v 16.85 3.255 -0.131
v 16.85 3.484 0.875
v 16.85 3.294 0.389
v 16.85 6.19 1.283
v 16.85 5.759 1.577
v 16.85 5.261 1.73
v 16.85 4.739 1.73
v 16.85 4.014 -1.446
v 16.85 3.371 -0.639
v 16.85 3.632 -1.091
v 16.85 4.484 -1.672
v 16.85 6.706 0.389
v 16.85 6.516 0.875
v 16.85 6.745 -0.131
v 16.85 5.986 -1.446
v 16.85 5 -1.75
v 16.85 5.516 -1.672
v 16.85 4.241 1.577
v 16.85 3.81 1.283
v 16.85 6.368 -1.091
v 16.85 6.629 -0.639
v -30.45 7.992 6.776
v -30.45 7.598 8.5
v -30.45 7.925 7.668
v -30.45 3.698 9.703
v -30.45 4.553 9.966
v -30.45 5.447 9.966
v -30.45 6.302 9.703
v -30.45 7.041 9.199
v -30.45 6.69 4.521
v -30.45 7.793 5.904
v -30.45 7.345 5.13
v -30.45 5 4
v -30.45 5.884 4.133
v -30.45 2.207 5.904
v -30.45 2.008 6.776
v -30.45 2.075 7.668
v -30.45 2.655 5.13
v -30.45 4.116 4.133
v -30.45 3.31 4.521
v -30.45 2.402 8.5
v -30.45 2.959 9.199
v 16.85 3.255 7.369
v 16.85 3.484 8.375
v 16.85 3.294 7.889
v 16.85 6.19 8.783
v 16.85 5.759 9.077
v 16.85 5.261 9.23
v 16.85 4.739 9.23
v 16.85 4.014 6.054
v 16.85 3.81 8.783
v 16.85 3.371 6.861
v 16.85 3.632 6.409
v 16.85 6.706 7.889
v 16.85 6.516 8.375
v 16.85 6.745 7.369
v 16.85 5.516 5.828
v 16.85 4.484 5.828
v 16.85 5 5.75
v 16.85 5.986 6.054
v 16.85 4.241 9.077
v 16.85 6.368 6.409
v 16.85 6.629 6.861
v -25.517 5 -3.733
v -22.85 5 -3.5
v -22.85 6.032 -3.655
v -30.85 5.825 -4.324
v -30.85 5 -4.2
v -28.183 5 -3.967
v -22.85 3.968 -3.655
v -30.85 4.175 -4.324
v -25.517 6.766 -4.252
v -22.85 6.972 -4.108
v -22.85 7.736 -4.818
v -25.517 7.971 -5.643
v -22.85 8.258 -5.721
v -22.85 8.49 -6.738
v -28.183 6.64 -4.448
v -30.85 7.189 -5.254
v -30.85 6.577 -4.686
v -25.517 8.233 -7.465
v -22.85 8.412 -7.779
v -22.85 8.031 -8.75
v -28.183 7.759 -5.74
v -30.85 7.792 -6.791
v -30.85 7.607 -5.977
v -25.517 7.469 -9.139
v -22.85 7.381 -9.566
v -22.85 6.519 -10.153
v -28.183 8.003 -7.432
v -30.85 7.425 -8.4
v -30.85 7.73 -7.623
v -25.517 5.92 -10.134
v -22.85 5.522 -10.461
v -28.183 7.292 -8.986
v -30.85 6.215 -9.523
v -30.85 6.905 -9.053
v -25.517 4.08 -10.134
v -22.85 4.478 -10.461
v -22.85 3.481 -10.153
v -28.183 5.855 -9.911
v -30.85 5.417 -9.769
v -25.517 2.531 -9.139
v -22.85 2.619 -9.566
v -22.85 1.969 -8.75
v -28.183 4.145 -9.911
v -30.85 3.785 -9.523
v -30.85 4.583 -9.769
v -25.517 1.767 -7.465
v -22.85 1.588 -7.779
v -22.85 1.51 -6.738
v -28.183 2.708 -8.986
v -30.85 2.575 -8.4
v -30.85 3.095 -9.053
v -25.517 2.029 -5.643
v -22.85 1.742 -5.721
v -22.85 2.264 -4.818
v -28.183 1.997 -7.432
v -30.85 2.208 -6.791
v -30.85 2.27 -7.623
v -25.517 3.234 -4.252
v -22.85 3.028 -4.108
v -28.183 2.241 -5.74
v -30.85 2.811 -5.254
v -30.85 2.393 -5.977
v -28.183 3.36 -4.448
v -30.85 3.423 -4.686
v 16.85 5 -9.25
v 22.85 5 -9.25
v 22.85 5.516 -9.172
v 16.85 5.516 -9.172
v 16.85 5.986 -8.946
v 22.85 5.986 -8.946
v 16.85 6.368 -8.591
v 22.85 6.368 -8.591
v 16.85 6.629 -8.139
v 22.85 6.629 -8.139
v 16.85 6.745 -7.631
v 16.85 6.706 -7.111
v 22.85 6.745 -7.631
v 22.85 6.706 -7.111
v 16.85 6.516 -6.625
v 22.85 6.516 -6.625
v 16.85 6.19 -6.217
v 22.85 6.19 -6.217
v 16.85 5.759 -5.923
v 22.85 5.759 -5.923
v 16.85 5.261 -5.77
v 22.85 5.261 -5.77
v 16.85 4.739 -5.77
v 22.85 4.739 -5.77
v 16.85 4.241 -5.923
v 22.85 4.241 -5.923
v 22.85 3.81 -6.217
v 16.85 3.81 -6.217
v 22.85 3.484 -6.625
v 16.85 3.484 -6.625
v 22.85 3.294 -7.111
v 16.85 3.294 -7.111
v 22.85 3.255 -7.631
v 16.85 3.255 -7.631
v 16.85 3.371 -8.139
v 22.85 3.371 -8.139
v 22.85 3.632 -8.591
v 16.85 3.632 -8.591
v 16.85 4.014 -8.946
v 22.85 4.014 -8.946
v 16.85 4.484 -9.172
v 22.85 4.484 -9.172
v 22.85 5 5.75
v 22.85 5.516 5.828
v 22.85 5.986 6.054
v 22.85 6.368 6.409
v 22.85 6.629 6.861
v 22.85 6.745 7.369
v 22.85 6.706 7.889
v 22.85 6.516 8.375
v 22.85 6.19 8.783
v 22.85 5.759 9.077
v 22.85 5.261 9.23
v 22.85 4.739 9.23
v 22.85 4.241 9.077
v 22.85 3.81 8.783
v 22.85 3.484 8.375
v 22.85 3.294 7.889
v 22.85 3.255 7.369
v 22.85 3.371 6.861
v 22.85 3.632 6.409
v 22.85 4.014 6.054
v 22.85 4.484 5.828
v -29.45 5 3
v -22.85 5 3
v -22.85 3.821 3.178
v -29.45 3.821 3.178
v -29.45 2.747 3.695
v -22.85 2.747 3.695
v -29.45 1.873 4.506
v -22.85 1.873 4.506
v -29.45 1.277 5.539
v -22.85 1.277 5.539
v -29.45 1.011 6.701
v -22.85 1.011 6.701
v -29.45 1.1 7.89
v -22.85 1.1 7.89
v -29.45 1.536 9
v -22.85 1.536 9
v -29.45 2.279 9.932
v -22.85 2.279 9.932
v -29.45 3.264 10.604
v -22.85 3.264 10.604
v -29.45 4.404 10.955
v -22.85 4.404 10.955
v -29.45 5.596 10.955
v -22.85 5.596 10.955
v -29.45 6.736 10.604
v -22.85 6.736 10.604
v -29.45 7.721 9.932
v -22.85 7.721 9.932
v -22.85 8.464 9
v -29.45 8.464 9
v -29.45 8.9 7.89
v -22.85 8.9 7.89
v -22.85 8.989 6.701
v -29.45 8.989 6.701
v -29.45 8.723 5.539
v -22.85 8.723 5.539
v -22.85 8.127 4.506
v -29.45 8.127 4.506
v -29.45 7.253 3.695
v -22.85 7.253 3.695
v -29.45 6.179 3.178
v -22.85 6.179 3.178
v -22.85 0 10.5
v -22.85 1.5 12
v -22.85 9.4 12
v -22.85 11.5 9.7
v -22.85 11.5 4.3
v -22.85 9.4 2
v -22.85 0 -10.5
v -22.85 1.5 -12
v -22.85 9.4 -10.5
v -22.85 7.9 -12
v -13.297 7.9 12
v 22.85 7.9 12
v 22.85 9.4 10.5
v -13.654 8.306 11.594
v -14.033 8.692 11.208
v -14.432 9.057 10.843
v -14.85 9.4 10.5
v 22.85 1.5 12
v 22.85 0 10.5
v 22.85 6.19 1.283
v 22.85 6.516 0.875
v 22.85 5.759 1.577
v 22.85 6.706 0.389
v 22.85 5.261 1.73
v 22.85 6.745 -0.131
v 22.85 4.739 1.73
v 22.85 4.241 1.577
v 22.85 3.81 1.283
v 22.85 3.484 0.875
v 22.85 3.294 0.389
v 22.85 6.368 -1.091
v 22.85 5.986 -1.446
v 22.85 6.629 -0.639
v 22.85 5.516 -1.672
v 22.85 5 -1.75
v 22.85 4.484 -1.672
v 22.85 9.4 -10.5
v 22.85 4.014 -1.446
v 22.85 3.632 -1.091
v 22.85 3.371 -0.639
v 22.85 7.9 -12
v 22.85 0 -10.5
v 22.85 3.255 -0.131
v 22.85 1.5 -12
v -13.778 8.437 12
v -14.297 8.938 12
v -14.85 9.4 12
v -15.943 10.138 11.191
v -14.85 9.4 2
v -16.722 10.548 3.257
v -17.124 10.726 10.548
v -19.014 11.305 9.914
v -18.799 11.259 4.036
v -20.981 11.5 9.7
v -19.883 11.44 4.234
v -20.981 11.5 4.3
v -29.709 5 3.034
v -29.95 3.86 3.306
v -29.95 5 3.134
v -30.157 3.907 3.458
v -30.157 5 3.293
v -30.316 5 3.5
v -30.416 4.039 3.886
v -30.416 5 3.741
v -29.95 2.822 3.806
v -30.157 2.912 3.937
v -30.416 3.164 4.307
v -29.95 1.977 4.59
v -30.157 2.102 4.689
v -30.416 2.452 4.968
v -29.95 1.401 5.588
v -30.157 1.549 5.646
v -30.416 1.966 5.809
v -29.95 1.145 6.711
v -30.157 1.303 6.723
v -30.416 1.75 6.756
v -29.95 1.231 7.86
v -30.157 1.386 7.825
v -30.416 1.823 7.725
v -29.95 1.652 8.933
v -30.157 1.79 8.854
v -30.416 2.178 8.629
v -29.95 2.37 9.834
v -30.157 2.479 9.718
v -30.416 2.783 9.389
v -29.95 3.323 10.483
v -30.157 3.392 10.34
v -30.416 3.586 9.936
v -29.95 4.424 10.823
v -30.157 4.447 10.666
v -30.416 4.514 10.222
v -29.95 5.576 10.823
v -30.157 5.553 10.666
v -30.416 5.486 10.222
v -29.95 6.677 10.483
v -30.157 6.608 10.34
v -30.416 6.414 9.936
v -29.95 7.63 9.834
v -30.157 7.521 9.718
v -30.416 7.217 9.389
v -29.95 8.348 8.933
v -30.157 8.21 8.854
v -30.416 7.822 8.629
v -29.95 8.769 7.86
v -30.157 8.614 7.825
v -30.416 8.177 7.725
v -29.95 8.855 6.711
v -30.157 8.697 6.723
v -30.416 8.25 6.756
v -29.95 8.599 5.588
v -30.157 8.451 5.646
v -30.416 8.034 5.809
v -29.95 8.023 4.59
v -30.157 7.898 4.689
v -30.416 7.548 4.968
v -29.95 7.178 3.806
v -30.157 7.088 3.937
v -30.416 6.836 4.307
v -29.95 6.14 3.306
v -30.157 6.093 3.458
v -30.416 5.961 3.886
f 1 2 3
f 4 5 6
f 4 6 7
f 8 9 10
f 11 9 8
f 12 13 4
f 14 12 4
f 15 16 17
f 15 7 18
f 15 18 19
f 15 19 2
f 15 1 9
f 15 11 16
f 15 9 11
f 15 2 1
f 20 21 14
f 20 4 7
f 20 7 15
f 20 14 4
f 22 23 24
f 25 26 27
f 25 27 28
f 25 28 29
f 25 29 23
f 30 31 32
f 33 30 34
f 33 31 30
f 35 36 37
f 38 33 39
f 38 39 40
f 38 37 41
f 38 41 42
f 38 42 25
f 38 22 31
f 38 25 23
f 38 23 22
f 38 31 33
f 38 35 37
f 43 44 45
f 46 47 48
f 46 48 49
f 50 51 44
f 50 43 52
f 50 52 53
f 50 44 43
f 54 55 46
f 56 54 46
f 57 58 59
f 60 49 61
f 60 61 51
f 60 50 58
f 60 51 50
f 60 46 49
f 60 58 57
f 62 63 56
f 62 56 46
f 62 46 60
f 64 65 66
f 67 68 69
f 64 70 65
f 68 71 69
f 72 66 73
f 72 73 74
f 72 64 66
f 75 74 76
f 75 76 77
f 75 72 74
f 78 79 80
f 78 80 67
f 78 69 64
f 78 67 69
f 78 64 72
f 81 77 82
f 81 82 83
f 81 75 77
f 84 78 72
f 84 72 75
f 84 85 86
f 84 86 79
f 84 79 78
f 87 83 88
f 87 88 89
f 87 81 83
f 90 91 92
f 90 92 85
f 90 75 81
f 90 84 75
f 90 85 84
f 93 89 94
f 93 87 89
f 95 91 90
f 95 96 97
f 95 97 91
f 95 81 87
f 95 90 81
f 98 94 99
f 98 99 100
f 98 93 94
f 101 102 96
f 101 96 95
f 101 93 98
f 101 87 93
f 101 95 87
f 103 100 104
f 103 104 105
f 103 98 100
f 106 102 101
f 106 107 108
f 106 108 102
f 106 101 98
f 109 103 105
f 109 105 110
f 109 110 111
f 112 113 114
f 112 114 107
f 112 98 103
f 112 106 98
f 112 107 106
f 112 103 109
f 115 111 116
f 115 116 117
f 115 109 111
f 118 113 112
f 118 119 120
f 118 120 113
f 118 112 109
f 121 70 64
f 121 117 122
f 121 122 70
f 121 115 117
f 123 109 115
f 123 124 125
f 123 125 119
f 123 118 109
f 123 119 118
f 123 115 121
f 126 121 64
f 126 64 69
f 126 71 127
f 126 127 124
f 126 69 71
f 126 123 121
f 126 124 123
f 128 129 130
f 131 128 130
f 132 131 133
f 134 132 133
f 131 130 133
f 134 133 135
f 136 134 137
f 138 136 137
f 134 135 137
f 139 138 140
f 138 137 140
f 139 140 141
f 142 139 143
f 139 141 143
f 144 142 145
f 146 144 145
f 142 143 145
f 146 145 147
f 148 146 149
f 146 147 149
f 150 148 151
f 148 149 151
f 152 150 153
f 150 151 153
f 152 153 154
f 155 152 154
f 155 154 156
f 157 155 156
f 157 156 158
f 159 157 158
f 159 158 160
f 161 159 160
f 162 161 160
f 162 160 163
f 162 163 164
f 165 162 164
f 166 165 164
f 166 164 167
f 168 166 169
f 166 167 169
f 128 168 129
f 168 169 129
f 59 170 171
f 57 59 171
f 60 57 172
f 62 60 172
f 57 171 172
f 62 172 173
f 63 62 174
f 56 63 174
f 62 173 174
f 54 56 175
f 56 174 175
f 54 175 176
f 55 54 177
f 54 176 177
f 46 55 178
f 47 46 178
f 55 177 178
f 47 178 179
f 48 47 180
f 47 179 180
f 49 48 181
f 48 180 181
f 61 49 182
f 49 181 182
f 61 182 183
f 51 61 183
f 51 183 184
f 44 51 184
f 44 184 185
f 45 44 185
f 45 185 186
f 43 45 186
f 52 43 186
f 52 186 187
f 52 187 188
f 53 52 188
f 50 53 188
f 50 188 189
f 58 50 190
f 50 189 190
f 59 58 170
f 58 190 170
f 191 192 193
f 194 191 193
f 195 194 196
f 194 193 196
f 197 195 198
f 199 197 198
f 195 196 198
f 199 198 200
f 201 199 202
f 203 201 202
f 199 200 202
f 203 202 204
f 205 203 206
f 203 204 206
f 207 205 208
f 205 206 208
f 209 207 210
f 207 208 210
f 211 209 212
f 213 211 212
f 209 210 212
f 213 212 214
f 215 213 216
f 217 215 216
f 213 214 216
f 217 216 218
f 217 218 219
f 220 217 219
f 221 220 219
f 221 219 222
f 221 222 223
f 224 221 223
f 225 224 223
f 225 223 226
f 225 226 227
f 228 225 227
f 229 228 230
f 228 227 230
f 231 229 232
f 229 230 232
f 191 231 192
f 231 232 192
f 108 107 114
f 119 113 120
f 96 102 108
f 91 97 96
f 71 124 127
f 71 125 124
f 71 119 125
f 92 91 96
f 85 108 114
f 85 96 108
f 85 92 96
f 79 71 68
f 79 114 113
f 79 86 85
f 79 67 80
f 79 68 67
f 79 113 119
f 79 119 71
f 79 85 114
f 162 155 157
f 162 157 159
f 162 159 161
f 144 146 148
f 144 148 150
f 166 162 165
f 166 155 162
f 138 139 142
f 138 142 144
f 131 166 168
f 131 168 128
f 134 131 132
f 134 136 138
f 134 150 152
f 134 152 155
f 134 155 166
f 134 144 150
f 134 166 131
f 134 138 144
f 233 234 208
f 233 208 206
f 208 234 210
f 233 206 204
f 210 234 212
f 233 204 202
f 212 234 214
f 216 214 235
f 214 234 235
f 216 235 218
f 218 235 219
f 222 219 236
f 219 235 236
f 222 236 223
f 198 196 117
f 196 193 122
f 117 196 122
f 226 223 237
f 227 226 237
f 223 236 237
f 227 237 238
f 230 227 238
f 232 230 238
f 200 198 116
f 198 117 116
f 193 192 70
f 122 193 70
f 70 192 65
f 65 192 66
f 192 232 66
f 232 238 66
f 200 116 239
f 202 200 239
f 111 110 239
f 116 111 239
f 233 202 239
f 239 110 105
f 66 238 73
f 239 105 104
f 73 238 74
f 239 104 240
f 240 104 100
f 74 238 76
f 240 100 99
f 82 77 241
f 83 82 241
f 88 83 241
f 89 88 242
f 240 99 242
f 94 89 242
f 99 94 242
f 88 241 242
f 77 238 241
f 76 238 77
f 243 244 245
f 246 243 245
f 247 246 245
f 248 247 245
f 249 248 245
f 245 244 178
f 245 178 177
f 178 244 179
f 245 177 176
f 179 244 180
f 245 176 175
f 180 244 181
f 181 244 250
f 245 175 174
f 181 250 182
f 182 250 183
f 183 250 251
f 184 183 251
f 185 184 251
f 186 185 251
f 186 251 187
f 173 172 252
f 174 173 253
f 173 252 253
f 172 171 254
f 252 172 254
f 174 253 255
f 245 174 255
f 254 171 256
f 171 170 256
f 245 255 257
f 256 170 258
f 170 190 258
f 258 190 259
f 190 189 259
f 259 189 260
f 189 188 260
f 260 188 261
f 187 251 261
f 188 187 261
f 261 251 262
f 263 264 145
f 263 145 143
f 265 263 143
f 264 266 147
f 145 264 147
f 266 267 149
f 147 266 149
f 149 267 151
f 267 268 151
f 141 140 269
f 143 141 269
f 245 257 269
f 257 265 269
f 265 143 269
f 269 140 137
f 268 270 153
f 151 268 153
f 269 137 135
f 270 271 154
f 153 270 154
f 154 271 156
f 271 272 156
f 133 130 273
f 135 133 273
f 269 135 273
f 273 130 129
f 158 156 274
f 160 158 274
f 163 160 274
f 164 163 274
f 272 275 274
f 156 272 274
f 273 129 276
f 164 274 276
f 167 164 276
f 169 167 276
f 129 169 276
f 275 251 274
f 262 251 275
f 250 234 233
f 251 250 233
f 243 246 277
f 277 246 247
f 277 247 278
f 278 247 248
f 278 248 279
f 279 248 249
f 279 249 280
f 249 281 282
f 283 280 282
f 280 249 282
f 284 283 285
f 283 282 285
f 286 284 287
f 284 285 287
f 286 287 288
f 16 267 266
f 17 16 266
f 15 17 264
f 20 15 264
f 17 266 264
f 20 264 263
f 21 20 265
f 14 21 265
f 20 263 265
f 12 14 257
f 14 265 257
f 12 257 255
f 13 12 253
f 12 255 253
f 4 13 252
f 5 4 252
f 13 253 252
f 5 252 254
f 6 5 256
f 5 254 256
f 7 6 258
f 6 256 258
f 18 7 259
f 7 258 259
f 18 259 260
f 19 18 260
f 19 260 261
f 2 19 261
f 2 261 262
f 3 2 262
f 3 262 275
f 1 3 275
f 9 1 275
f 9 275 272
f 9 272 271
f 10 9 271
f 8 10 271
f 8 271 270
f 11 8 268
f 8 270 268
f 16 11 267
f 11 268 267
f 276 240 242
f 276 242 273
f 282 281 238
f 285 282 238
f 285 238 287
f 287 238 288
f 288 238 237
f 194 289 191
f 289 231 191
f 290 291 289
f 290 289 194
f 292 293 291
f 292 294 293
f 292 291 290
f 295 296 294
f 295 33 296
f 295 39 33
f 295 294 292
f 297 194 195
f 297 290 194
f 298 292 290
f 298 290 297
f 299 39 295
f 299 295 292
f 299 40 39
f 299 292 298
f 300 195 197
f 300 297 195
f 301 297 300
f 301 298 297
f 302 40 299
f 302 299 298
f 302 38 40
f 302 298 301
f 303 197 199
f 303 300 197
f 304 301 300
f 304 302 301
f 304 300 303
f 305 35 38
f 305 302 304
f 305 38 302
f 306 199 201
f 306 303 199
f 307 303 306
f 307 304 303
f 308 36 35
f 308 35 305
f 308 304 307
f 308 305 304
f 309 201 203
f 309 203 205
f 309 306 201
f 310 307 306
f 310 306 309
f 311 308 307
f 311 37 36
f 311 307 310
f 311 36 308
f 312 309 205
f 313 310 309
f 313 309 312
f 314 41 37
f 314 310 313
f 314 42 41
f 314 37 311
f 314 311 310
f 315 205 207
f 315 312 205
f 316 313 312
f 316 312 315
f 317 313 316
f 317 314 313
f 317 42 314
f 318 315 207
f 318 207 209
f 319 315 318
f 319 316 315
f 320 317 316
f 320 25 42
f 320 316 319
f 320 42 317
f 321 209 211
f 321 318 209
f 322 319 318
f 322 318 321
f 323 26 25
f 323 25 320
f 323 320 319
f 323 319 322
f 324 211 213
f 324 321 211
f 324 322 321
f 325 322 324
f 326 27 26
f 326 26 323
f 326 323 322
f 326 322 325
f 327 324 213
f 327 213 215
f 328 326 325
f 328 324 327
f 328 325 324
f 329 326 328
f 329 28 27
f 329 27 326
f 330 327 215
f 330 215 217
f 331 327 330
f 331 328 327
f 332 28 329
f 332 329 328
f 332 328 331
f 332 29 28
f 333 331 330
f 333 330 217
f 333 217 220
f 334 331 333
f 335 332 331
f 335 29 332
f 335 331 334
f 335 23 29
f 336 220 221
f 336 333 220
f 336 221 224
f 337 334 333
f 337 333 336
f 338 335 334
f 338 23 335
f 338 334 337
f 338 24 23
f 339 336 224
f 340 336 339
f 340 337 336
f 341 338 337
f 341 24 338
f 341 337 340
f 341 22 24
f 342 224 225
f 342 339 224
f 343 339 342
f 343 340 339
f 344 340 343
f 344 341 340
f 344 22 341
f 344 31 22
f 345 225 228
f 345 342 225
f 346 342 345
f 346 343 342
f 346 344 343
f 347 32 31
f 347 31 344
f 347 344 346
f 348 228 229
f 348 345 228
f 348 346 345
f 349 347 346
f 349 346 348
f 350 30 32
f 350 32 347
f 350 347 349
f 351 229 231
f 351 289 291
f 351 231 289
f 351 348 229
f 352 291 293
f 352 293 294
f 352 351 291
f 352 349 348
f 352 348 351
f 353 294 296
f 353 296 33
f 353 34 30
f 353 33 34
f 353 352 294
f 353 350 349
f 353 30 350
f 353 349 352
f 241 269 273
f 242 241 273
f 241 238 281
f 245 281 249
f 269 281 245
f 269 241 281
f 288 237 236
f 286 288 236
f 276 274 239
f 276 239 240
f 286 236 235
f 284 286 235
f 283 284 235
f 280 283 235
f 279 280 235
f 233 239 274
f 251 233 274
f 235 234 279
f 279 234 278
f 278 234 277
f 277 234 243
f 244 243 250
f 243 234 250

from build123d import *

# Parameters (mm, degrees)
SKETCH_1_W          = 45.7
SKETCH_1_H          = 24
EXTRUDE_1_DEPTH     = 9.4
SKETCH_2_R          = 1.75
CUT_EXTRUDE_1_DEPTH = 6
SKETCH_3_R          = 4
EXTRUDE_2_DEPTH     = 7.6
EXTRUDE_3_DEPTH     = 8
FILLET_1_R          = 10
CHAMFER_1_SIZE      = 1.5
SKETCH_5_R          = 3.5
EXTRUDE_4_DEPTH     = 8
EXTRUDE_4_TAPER     = 5
FILLET_2_R          = 1


with BuildPart() as part:
    # 草图1 → 凸台-拉伸1 (new body)
    with BuildSketch(Plane(origin=(0, 0, 0), x_dir=(1, 0, 0), z_dir=(0, 1, 0))):
        Rectangle(SKETCH_1_W, SKETCH_1_H)
    extrude(amount=EXTRUDE_1_DEPTH)

    # 草图2 → 切除-拉伸1 (cut)
    with BuildSketch(Plane(origin=(22.85, 0, 0), x_dir=(0, 0, -1), z_dir=(1, 0, 0))):
        with Locations((-7.5, 5)):
            Circle(SKETCH_2_R)
        with Locations((0, 5)):
            Circle(SKETCH_2_R)
        with Locations((7.5, 5)):
            Circle(SKETCH_2_R)
    extrude(amount=-CUT_EXTRUDE_1_DEPTH, mode=Mode.SUBTRACT)

    # 草图3 → 凸台-拉伸2 (add)
    with BuildSketch(Plane.ZY.offset(22.85)):
        with Locations(Location((7, 5, 0), (0, 0, 180))):
            Circle(SKETCH_3_R)
    extrude(amount=EXTRUDE_2_DEPTH)

    # 草图4 → 凸台-拉伸3 (add)
    with BuildSketch(Plane.ZY.offset(22.85)):
        Polygon((4.3, 11.5), (9.7, 11.5), (12, 9.4), (2, 9.4), align=None)
    extrude(amount=-EXTRUDE_3_DEPTH)

    # 圆角1
    # the kernel refuses this fillet: 10 mm, written as the material it takes off along each edge
    with BuildSketch(Plane(origin=(-14.85, 11.5, -11.027671056), x_dir=(-1, 0, 0), z_dir=(0, 0, 1))) as fillet_1_piece_1:
        with BuildLine():
            CenterArc((6.131068422, 10), FILLET_1_R, 232.185511494, 37.814488506)
            Line((0, 2.1), (0, 0))
            Line((0, 0), (6.131068422, 0))
        make_face()
    extrude(amount=36.055342112, mode=Mode.SUBTRACT)

    # 倒角1
    # the kernel refuses this chamfer: 1.5 mm, written as the material it takes off along each edge
    with BuildSketch(Plane(origin=(-18.707524482, 9.4, 12), x_dir=(0, -1, 0), z_dir=(1, 0, 0))) as chamfer_1_piece_1_section:
        Polygon((CHAMFER_1_SIZE, 0), (0, CHAMFER_1_SIZE), (0, 0), align=None)
    chamfer_1_piece_1 = extrude(amount=45.415048964, mode=Mode.PRIVATE)
    chamfer_1_piece_1 = chamfer_1_piece_1 - Plane(origin=(-20.981068422, 1.5, 12), x_dir=(-1, 0, 0), z_dir=(0, 0, -1)) * Cylinder(10, 97, mode=Mode.PRIVATE)
    add(chamfer_1_piece_1, mode=Mode.SUBTRACT)
    with BuildSketch(Plane(origin=(-26.707524482, 0, 12), x_dir=(0, 1, 0), z_dir=(1, 0, 0)), Plane(origin=(26.707524482, 9.4, -12), x_dir=(0, 0, 1), z_dir=(-1, 0, 0))) as chamfer_1_piece_2:
        Polygon((CHAMFER_1_SIZE, 0), (0, -CHAMFER_1_SIZE), (0, 0), align=None)
    extrude(amount=53.415048964, mode=Mode.SUBTRACT)
    with BuildSketch(Plane(origin=(26.707524482, 0, -12), x_dir=(0, 0, 1), z_dir=(-1, 0, 0))) as chamfer_1_piece_3:
        Polygon((CHAMFER_1_SIZE, 0), (0, CHAMFER_1_SIZE), (0, 0), align=None)
    extrude(amount=53.415048964, mode=Mode.SUBTRACT)

    # 草图5 → 凸台-拉伸4 (add)
    with BuildSketch(Plane.ZY.offset(22.85)):
        with Locations((-7, 5)):
            Circle(SKETCH_5_R)
    extrude(amount=EXTRUDE_4_DEPTH, taper=EXTRUDE_4_TAPER)

    # 圆角2
    fillet_2_edges = [part.edges().sort_by_distance(p)[0] for p in [
        (-30.45, 5, 11),
    ]]
    fillet(fillet_2_edges, radius=FILLET_2_R)


solid = part.part
